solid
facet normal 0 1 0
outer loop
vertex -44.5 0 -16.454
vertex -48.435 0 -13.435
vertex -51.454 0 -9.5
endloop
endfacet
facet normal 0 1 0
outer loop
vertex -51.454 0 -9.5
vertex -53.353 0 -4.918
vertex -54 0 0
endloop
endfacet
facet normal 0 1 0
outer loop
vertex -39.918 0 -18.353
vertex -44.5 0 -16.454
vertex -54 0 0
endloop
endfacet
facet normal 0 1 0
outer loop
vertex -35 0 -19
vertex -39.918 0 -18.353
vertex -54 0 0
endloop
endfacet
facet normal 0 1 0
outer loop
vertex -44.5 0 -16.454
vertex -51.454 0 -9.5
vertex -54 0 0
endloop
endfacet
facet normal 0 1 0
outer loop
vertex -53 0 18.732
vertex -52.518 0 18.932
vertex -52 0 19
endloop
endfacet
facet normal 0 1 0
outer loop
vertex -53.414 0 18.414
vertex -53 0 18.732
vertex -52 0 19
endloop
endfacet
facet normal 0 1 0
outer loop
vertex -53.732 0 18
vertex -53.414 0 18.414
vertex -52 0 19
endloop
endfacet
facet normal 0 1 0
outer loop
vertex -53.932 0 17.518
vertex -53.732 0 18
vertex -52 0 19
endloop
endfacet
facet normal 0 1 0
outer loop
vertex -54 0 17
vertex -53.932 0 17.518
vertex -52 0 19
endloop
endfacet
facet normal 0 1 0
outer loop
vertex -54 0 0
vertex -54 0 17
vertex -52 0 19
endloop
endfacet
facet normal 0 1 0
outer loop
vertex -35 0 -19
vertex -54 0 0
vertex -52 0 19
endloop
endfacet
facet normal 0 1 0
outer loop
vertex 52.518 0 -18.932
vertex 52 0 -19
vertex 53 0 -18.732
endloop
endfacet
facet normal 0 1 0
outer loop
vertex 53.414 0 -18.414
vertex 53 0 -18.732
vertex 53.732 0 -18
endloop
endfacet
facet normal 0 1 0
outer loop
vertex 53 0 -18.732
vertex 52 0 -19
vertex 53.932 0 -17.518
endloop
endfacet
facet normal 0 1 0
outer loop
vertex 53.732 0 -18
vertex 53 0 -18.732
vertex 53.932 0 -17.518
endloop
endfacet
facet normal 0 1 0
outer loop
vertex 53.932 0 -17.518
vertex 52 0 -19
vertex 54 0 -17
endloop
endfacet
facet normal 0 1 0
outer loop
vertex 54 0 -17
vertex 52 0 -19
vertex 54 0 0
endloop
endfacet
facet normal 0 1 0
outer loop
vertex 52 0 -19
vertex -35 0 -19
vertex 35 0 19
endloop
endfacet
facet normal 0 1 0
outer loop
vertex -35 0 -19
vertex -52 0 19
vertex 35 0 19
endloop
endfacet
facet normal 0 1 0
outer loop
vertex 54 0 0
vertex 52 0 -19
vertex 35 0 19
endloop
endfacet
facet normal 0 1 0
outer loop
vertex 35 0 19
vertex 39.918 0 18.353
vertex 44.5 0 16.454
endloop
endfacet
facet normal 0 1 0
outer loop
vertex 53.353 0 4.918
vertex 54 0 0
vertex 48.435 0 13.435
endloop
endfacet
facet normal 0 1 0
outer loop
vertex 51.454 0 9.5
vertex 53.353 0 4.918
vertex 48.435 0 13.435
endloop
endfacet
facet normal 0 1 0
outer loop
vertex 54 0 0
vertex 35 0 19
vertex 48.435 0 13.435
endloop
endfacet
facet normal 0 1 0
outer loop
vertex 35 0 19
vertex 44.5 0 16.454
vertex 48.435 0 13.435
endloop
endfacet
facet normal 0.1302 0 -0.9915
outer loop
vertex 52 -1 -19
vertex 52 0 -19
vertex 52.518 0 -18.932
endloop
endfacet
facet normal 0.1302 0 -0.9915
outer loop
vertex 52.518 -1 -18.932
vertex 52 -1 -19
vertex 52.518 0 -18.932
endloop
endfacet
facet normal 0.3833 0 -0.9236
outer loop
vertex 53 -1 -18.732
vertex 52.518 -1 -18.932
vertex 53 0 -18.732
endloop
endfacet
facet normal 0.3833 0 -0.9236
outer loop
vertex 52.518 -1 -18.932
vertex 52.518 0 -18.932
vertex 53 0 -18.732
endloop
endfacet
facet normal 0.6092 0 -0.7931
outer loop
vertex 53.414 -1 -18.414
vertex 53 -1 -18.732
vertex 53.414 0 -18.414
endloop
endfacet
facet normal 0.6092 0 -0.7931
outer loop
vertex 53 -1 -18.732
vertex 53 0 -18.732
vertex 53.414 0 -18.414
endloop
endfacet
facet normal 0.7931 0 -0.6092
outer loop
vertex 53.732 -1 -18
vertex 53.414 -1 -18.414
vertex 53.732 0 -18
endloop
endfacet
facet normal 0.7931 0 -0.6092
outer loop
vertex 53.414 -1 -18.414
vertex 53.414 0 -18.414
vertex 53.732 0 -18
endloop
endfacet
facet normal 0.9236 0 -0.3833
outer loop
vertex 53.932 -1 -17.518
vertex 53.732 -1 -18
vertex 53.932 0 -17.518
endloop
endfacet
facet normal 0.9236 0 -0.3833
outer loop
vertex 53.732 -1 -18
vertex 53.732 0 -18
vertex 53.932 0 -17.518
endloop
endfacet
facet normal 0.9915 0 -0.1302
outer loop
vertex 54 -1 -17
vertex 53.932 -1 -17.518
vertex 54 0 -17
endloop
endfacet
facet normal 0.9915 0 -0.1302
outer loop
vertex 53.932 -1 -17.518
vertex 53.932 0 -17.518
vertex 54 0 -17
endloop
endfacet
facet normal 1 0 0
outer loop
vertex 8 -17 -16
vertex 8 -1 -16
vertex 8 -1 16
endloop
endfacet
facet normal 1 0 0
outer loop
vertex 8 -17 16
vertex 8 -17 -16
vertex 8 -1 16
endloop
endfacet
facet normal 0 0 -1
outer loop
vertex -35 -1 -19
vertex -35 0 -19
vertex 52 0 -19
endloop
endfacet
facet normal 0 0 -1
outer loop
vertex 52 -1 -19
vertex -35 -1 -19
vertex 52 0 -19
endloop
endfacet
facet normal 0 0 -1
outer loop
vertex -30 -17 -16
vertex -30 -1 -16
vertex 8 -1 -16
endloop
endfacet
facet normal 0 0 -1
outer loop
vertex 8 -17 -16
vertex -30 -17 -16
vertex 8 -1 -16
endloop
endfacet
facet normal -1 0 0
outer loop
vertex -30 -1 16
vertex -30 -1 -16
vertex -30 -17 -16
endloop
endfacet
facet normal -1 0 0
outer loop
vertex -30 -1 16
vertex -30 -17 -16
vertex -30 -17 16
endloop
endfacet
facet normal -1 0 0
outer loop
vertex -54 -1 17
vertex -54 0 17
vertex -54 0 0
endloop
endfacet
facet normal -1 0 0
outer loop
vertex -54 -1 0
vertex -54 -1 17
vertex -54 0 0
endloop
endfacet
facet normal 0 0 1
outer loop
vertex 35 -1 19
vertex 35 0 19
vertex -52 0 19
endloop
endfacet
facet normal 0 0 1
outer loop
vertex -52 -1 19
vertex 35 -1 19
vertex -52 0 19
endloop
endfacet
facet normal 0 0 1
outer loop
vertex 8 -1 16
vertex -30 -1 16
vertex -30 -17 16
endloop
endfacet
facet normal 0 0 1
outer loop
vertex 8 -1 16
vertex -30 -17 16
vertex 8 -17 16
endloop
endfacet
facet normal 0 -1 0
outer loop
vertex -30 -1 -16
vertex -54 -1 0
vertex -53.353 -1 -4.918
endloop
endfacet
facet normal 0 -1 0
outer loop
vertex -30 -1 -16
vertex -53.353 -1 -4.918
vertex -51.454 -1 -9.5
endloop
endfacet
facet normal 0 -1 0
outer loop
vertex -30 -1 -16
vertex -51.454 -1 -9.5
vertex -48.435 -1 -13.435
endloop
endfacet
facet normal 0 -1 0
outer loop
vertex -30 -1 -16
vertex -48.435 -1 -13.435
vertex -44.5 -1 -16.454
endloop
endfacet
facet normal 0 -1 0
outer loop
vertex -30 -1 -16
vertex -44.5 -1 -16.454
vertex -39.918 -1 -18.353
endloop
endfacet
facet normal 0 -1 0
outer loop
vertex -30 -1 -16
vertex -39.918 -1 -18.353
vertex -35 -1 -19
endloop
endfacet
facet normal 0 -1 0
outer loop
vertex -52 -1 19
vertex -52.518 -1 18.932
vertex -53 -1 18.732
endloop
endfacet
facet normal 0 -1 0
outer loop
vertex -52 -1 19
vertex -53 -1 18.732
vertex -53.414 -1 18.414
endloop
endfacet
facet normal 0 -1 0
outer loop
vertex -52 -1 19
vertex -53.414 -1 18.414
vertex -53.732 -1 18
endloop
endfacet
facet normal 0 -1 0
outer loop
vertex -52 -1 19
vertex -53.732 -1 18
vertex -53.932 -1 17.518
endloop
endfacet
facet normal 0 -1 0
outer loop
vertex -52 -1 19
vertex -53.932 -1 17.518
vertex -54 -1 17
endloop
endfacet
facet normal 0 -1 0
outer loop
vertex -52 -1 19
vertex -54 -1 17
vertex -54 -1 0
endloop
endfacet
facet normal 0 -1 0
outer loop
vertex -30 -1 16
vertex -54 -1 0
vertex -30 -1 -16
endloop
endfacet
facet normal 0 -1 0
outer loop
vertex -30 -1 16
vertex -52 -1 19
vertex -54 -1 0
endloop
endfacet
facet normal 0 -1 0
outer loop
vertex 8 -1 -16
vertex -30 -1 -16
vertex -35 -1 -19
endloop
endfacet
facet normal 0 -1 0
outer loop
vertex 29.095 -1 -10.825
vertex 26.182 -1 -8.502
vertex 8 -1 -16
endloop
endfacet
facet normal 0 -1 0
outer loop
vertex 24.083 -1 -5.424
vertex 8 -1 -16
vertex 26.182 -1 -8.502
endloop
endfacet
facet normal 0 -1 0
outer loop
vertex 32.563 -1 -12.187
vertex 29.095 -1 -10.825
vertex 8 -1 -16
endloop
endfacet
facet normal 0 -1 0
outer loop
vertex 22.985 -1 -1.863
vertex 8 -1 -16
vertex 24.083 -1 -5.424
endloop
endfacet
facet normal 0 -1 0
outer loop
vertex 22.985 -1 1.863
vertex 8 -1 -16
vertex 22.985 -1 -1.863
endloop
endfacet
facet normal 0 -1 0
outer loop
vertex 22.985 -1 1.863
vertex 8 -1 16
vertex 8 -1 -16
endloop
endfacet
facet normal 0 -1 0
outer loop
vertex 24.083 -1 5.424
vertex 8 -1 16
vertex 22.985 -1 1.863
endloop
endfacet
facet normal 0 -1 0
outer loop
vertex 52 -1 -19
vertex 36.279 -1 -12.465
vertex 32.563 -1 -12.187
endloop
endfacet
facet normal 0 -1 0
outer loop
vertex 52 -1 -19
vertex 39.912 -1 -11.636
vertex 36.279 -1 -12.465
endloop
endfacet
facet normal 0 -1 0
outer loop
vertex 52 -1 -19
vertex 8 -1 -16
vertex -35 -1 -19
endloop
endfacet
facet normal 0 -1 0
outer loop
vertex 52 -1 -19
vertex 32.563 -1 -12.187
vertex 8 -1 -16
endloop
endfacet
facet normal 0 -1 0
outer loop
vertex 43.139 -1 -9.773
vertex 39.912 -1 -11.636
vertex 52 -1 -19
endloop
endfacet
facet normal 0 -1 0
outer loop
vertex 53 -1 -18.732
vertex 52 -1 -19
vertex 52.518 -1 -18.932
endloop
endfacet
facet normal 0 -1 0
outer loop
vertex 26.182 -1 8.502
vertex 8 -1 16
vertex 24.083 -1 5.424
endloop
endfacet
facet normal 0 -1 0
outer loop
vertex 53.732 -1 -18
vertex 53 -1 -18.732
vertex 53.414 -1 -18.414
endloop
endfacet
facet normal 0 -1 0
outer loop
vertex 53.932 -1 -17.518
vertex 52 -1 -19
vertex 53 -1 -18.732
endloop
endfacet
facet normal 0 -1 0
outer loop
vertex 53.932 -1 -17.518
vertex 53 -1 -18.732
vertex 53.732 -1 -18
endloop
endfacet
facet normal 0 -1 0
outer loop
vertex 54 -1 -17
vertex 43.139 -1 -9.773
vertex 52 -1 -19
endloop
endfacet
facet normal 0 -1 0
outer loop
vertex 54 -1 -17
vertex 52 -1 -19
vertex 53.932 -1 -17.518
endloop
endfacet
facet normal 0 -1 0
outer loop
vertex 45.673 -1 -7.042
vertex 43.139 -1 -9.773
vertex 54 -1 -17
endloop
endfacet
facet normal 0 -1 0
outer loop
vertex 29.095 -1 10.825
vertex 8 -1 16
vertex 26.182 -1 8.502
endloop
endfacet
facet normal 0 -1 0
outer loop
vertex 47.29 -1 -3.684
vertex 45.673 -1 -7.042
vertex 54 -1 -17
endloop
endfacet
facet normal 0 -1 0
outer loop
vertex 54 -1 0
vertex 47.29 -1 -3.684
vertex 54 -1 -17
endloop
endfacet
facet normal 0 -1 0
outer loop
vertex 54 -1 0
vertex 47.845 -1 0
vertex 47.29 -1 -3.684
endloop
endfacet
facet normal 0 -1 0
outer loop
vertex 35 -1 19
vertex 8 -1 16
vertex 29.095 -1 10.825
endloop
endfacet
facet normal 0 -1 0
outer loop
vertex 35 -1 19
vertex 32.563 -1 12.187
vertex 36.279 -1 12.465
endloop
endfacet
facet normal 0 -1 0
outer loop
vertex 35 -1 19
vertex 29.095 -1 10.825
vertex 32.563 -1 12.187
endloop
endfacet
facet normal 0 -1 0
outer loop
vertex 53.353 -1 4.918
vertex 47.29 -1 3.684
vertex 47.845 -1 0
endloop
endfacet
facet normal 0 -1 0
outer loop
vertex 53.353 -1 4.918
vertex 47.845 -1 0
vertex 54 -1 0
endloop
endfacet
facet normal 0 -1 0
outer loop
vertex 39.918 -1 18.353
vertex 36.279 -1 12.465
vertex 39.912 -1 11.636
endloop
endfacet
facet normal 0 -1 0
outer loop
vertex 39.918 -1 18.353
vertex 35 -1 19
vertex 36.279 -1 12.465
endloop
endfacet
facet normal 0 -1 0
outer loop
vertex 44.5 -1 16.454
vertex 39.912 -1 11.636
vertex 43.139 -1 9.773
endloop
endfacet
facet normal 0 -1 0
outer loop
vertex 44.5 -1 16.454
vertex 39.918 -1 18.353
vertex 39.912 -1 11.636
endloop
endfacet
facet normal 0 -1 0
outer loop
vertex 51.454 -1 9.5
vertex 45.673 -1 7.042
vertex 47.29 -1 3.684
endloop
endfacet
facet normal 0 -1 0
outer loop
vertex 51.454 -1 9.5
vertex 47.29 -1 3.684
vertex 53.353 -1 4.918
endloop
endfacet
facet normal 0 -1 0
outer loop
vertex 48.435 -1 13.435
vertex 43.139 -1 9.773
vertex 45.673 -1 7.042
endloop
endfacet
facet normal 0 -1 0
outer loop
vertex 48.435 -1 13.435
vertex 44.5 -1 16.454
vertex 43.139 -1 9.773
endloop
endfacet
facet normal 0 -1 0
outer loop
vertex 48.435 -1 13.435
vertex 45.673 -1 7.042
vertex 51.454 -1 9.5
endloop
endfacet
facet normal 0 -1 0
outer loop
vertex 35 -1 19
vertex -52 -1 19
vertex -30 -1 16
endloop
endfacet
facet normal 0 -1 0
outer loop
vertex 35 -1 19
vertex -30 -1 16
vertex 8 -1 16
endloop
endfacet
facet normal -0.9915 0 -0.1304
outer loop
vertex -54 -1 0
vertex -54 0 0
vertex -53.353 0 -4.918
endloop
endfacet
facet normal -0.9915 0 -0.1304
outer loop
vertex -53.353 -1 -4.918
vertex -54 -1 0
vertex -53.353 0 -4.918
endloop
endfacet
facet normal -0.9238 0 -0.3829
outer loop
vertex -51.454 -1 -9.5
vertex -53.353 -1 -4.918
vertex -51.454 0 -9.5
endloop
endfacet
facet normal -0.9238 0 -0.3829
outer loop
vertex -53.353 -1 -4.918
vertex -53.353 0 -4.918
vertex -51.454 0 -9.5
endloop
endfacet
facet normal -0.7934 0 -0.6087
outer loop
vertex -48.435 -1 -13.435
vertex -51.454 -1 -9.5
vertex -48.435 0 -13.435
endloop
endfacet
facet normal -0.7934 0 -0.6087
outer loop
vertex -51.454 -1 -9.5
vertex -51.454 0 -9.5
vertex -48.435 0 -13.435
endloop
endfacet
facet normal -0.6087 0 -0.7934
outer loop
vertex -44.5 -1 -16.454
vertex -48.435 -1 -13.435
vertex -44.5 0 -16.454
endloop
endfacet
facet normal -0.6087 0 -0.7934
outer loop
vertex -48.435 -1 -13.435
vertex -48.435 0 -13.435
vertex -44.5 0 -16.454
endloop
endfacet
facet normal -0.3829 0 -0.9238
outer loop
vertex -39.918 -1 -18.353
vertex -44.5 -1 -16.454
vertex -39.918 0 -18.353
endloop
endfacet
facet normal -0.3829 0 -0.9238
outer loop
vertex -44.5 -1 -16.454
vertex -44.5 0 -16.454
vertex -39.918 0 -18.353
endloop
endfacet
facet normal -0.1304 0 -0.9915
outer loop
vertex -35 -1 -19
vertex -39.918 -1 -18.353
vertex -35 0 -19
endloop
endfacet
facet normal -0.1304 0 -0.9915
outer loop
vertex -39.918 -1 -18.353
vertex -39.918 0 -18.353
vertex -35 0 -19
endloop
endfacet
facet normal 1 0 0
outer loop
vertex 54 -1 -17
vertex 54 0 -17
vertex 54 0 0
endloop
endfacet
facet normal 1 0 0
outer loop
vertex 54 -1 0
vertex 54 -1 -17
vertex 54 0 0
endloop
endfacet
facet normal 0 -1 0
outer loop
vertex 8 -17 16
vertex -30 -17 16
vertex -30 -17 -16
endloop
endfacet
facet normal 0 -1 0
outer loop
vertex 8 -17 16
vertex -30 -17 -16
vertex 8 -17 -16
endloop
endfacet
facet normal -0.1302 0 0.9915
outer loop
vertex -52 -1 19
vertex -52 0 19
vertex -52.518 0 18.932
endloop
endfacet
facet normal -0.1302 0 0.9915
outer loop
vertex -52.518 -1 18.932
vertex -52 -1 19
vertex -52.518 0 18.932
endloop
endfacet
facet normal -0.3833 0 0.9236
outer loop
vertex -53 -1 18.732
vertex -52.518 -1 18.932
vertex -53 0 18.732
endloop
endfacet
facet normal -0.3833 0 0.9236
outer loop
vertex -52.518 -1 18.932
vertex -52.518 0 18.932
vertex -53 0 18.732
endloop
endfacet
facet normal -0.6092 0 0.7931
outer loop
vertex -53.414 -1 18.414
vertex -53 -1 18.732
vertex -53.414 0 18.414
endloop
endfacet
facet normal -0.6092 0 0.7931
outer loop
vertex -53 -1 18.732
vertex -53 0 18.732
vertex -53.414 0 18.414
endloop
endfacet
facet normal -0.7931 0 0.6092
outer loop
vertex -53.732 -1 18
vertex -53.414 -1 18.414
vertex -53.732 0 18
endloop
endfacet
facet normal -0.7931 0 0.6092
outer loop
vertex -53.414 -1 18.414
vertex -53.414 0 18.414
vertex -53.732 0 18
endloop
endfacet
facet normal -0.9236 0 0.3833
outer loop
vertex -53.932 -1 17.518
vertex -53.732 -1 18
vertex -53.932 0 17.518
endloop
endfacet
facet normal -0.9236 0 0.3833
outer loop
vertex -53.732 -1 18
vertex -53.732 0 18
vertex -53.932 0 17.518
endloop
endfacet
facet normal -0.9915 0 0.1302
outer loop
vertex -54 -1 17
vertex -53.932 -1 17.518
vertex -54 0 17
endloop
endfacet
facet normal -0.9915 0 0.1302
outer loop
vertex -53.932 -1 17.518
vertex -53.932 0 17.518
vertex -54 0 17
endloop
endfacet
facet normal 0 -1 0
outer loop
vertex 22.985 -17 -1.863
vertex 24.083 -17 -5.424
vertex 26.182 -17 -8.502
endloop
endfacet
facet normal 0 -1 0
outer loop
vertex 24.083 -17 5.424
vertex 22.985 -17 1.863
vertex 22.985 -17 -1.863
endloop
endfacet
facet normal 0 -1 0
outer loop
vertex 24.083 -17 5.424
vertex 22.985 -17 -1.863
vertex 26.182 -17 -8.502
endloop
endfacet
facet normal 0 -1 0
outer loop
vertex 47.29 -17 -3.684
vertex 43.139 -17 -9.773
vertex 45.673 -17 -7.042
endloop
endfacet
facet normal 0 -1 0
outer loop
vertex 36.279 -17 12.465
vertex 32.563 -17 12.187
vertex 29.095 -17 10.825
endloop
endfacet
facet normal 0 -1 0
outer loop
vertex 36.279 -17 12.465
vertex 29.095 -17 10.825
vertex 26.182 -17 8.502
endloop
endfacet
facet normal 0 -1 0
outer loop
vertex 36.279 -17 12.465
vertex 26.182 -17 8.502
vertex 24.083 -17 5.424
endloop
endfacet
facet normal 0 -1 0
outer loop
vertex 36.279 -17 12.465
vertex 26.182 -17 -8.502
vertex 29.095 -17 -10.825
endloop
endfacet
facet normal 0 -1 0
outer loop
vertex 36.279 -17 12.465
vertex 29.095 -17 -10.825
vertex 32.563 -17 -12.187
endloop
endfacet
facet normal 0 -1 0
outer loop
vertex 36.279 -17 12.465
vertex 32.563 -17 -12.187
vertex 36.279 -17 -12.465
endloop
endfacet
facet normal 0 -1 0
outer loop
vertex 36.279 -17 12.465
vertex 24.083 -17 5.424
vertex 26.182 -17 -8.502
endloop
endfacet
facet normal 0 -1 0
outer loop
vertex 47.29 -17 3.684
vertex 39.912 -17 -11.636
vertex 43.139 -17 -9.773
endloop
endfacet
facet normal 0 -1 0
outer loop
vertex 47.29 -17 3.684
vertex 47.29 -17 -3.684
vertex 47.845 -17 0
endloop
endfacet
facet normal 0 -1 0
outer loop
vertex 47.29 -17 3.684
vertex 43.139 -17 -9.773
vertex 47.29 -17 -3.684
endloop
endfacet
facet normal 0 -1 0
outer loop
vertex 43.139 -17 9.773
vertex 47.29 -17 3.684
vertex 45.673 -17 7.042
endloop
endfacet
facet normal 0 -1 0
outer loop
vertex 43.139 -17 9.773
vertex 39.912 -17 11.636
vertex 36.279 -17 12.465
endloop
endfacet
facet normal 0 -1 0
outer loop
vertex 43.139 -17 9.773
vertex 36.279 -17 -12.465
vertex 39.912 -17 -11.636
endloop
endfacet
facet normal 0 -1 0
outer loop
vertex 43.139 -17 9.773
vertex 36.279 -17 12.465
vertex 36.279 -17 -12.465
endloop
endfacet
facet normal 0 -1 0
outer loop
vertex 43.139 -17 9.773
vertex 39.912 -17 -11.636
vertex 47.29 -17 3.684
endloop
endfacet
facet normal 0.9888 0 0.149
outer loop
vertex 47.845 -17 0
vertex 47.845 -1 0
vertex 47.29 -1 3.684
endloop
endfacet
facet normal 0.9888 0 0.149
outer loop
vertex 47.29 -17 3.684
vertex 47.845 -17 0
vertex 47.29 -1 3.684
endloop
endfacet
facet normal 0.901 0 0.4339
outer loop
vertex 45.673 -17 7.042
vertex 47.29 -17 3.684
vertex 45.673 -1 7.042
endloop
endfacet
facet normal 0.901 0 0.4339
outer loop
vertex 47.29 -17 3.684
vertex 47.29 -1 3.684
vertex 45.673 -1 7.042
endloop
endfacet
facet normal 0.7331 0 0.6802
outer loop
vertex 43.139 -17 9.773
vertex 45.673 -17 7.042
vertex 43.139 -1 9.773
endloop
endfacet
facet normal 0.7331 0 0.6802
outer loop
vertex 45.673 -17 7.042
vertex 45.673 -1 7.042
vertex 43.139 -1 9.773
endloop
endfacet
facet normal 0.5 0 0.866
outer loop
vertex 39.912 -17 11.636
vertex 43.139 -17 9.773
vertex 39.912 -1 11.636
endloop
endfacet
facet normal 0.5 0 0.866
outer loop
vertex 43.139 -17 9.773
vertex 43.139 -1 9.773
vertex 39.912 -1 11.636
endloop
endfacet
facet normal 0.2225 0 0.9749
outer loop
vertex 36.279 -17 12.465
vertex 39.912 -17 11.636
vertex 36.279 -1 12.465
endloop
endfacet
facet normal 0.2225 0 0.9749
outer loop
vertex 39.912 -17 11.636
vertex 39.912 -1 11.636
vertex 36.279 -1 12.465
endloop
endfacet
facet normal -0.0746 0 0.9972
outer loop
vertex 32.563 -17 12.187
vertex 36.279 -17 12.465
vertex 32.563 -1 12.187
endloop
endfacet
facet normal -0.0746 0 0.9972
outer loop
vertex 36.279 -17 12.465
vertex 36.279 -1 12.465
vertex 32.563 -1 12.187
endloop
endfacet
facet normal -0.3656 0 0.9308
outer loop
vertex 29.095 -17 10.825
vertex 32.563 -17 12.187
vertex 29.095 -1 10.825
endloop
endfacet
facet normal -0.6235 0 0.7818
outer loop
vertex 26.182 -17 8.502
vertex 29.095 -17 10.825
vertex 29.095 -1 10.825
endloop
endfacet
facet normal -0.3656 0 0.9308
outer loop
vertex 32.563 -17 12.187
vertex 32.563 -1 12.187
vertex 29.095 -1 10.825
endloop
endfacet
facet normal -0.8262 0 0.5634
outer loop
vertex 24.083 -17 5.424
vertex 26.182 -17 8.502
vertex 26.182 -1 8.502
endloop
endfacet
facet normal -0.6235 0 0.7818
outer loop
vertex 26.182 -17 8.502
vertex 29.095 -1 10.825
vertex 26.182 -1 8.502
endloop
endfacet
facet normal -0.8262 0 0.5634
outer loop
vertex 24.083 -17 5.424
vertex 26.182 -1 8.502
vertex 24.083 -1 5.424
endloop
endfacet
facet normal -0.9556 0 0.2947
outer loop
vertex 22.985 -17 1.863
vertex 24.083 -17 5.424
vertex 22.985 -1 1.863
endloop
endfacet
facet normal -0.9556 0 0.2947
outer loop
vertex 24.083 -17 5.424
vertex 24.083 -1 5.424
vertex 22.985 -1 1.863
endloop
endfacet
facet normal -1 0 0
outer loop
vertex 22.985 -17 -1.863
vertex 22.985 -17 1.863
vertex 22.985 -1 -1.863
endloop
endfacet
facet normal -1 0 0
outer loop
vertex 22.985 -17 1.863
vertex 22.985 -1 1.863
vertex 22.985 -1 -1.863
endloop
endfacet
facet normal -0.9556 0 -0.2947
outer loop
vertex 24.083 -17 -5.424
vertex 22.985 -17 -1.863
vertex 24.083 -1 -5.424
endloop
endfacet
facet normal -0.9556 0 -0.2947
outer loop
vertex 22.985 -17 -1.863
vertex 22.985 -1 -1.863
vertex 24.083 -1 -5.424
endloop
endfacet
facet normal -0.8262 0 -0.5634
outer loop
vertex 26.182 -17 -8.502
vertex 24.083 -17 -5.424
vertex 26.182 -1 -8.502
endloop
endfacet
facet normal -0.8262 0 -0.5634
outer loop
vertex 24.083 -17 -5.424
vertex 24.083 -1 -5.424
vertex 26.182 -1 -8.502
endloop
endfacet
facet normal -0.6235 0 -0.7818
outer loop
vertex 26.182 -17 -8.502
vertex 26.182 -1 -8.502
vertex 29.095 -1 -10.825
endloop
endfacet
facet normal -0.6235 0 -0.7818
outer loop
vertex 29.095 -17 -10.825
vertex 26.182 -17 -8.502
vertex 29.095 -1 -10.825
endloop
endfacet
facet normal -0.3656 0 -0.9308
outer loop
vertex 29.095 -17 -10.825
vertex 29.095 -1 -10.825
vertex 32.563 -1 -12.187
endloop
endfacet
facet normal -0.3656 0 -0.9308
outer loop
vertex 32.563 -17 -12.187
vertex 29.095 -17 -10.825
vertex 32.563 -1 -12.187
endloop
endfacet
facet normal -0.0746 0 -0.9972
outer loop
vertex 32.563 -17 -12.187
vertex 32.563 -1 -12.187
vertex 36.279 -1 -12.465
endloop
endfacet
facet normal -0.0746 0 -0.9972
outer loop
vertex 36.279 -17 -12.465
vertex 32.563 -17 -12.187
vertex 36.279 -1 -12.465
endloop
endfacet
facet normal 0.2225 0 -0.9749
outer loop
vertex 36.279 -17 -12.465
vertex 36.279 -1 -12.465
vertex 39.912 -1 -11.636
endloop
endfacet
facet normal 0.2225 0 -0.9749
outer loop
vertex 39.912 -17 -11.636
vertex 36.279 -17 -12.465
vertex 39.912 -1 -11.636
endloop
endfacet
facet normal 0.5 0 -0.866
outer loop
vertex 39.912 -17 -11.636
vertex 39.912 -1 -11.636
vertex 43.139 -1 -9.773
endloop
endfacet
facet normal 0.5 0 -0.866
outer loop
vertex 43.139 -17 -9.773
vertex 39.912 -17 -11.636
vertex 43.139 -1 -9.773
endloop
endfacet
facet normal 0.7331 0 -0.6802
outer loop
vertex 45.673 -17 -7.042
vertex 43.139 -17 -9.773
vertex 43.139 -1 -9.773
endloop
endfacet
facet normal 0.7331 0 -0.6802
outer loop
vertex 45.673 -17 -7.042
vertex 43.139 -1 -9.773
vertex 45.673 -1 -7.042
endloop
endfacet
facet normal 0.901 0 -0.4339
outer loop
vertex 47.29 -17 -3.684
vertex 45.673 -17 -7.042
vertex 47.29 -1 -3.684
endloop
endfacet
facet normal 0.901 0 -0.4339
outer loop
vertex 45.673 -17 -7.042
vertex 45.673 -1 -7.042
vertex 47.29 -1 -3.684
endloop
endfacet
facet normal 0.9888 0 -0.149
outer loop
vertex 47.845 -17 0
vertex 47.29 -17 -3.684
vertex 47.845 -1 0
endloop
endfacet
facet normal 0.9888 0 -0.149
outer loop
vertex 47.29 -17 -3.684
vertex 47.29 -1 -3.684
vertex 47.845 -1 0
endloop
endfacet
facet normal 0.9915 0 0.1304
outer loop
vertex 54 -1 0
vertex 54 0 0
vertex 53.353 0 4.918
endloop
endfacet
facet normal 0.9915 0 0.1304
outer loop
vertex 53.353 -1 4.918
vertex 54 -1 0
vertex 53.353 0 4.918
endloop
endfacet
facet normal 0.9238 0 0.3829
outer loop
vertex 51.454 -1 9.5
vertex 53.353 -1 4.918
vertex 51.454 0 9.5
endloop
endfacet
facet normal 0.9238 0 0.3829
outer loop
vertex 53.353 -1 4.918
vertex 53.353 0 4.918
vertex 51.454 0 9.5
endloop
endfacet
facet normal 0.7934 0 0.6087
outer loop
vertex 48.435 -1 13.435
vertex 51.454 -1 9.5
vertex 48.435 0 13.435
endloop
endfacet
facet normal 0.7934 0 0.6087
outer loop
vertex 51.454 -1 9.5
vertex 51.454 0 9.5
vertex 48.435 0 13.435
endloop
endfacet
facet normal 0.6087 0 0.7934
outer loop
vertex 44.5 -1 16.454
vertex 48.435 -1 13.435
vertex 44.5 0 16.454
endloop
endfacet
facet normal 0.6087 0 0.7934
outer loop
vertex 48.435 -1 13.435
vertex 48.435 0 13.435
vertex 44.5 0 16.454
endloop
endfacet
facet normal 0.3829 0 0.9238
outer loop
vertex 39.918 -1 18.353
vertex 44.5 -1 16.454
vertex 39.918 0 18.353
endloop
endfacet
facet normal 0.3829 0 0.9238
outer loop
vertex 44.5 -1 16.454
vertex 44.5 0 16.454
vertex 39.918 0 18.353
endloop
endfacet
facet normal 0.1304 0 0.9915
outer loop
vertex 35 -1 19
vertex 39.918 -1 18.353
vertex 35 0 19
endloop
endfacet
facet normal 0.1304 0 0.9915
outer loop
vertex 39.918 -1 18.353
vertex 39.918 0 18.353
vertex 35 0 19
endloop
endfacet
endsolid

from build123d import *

# Parameters (mm, degrees)
F1_DEPTH = 1
F2_W     = 38
F2_H     = 32
F2_R     = 12.5
F3_DEPTH = 16


with BuildPart() as f1:
    # F0 (on Front) → F1 (new body)
    with BuildSketch(Plane.XZ):
        with BuildLine():
            ThreePointArc((54, 0), (48.435029, 13.435029), (35, 19))
            Line((35, 19), (-52, 19))
            ThreePointArc((-52, 19), (-53.414214, 18.414214), (-54, 17))
            Line((-54, 17), (-54, 0))
            ThreePointArc((-54, 0), (-48.435029, -13.435029), (-35, -19))
            Line((-35, -19), (52, -19))
            ThreePointArc((52, -19), (53.414214, -18.414214), (54, -17))
            Line((54, -17), (54, 0))
        make_face()
    extrude(amount=F1_DEPTH)

    # F2 (on face) → F3 (join)
    with BuildSketch(Plane.XZ.offset(1)):
        with Locations((-11, 0)):
            Rectangle(F2_W, F2_H)
        with Locations((35.345, 0)):
            Circle(F2_R)
    extrude(amount=F3_DEPTH)


solid = f1.part
